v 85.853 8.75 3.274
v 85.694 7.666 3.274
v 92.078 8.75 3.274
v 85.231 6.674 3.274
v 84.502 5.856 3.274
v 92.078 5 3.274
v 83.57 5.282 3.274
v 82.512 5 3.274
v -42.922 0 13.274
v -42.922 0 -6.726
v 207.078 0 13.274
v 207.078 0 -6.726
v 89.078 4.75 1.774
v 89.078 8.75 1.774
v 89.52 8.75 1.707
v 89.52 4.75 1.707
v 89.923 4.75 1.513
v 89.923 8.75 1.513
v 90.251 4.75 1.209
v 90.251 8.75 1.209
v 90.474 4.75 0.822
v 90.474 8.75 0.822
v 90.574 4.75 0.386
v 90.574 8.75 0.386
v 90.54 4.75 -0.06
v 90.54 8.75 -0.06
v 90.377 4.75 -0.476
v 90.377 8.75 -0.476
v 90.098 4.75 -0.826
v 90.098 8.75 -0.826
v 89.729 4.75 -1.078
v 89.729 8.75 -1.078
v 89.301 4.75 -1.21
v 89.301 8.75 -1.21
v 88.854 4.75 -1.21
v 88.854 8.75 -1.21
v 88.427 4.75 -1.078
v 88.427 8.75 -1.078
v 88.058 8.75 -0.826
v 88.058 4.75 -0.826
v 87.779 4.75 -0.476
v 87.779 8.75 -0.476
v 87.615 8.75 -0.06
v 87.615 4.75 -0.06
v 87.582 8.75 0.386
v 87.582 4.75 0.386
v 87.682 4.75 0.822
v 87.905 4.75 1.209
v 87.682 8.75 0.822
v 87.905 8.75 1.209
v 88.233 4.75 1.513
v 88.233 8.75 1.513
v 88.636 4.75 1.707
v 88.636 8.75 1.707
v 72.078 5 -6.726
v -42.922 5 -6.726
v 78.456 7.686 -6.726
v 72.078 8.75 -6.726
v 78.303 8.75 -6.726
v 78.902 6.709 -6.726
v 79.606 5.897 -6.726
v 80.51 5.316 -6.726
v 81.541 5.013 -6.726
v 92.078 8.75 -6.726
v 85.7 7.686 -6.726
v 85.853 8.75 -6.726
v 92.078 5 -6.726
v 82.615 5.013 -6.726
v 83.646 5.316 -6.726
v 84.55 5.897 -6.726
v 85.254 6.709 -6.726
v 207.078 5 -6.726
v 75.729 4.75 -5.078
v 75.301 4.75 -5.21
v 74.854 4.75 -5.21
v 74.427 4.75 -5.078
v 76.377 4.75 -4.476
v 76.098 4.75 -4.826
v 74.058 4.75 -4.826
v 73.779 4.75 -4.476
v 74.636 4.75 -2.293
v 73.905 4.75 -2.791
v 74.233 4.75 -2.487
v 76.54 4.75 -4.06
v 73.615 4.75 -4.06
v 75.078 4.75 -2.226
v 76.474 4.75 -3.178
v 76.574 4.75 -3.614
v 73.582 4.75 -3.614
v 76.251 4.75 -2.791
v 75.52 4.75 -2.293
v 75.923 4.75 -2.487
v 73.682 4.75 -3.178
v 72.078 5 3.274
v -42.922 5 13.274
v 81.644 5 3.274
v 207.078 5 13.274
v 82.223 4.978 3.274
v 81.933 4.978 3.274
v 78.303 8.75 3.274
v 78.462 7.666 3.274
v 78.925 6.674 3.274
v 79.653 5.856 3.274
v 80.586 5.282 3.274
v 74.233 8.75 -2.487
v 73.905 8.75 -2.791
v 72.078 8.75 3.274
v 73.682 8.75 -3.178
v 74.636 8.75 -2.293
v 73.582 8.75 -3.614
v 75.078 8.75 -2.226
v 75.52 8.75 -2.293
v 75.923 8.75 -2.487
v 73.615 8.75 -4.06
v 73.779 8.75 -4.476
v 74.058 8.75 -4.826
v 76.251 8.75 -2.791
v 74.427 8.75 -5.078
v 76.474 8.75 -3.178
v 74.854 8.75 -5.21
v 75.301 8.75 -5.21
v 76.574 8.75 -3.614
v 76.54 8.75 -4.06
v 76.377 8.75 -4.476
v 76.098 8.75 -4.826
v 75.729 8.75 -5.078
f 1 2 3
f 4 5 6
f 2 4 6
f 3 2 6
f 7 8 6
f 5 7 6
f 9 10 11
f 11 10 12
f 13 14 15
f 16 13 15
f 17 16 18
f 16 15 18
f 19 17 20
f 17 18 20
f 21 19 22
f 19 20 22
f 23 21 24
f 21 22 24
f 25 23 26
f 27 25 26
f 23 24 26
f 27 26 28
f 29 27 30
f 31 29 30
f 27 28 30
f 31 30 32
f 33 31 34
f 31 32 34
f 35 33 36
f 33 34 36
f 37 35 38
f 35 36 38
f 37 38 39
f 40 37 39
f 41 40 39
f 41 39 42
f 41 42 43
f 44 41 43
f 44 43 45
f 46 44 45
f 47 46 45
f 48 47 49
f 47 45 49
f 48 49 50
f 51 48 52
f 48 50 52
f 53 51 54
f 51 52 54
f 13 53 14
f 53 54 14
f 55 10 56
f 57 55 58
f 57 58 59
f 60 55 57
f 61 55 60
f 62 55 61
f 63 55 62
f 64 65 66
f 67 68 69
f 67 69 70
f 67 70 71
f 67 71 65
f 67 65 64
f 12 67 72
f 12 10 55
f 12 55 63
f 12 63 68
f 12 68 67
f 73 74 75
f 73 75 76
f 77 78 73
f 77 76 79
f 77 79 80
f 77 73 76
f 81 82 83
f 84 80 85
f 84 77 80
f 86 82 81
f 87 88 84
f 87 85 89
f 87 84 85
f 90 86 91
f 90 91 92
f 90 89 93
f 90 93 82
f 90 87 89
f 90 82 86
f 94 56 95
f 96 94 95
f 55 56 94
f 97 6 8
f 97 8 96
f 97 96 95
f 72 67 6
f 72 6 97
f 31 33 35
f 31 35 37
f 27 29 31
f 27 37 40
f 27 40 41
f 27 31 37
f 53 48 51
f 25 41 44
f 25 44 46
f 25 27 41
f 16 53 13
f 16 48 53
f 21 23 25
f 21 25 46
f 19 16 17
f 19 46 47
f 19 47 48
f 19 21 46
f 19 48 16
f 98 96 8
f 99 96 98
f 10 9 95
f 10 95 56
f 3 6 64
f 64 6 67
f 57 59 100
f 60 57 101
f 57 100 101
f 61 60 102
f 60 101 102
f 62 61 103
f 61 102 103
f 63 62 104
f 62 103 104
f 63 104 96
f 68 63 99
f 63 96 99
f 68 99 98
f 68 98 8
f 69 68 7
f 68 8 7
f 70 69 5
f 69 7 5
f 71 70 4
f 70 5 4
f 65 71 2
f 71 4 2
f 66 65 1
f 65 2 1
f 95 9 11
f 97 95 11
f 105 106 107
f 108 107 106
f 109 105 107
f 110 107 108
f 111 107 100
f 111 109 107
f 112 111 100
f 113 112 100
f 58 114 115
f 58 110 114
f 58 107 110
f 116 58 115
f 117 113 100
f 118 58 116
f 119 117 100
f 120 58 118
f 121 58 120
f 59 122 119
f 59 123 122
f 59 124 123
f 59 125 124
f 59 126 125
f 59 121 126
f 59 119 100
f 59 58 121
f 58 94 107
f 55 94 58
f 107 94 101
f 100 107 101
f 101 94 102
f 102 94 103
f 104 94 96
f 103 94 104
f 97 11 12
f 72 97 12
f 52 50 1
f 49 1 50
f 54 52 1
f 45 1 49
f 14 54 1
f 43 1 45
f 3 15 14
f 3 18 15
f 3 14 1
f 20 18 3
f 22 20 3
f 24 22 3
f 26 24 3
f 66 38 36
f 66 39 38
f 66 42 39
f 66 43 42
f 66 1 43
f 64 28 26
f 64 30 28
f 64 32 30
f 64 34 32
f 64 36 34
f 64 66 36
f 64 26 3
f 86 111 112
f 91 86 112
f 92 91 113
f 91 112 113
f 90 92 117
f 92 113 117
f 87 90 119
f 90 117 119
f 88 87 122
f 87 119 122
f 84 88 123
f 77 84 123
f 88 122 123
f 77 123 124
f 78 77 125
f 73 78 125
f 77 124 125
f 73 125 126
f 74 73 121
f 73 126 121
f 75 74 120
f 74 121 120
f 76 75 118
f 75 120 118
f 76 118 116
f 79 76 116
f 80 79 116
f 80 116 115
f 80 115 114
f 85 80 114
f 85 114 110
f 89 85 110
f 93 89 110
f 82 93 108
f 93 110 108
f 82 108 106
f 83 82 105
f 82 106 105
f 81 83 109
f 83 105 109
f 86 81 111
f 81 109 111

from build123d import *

# Parameters (mm, degrees)
SKETCH1_W           = 250
SKETCH1_H           = 20
BOSS_EXTRUDE1_DEPTH = 5
SKETCH2_W           = 20
SKETCH2_H           = 10
BOSS_EXTRUDE2_DEPTH = 3.75
SKETCH3_R           = 3.775
CUT_EXTRUDE1_DEPTH  = 10
SKETCH4_R           = 1.5
CUT_EXTRUDE2_DEPTH  = 4


with BuildPart() as part:
    # Sketch1 → Boss-Extrude1 (new body)
    with BuildSketch(Plane(origin=(0, 0, 0), x_dir=(1, 0, 0), z_dir=(0, 1, 0))):
        with Locations((82.077816098, -3.273623345)):
            Rectangle(SKETCH1_W, SKETCH1_H)
    extrude(amount=BOSS_EXTRUDE1_DEPTH)

    # Sketch2 → Boss-Extrude2 (add)
    with BuildSketch(Plane(origin=(0, 5, 0), x_dir=(1, 0, 0), z_dir=(0, 1, 0))):
        with Locations((82.077816098, 1.726376655)):
            Rectangle(SKETCH2_W, SKETCH2_H)
    extrude(amount=BOSS_EXTRUDE2_DEPTH)

    # Sketch3 → Cut-Extrude1 (cut)
    with BuildSketch(Plane.XY.offset(3.273623345)):
        with Locations((82.077816098, 8.75)):
            Circle(SKETCH3_R)
    extrude(amount=-CUT_EXTRUDE1_DEPTH, mode=Mode.SUBTRACT)

    # Sketch4 → Cut-Extrude2 (cut)
    with BuildSketch(Plane(origin=(0, 8.75, 0), x_dir=(1, 0, 0), z_dir=(0, 1, 0))):
        with Locations(Location((89.077816098, -0.273623345, 0), (0, 0, 270))):
            Circle(SKETCH4_R)
        with Locations(Location((75.077816098, 3.726376655, 0), (0, 0, 270))):
            Circle(SKETCH4_R)
    extrude(amount=-CUT_EXTRUDE2_DEPTH, mode=Mode.SUBTRACT)


solid = part.part
